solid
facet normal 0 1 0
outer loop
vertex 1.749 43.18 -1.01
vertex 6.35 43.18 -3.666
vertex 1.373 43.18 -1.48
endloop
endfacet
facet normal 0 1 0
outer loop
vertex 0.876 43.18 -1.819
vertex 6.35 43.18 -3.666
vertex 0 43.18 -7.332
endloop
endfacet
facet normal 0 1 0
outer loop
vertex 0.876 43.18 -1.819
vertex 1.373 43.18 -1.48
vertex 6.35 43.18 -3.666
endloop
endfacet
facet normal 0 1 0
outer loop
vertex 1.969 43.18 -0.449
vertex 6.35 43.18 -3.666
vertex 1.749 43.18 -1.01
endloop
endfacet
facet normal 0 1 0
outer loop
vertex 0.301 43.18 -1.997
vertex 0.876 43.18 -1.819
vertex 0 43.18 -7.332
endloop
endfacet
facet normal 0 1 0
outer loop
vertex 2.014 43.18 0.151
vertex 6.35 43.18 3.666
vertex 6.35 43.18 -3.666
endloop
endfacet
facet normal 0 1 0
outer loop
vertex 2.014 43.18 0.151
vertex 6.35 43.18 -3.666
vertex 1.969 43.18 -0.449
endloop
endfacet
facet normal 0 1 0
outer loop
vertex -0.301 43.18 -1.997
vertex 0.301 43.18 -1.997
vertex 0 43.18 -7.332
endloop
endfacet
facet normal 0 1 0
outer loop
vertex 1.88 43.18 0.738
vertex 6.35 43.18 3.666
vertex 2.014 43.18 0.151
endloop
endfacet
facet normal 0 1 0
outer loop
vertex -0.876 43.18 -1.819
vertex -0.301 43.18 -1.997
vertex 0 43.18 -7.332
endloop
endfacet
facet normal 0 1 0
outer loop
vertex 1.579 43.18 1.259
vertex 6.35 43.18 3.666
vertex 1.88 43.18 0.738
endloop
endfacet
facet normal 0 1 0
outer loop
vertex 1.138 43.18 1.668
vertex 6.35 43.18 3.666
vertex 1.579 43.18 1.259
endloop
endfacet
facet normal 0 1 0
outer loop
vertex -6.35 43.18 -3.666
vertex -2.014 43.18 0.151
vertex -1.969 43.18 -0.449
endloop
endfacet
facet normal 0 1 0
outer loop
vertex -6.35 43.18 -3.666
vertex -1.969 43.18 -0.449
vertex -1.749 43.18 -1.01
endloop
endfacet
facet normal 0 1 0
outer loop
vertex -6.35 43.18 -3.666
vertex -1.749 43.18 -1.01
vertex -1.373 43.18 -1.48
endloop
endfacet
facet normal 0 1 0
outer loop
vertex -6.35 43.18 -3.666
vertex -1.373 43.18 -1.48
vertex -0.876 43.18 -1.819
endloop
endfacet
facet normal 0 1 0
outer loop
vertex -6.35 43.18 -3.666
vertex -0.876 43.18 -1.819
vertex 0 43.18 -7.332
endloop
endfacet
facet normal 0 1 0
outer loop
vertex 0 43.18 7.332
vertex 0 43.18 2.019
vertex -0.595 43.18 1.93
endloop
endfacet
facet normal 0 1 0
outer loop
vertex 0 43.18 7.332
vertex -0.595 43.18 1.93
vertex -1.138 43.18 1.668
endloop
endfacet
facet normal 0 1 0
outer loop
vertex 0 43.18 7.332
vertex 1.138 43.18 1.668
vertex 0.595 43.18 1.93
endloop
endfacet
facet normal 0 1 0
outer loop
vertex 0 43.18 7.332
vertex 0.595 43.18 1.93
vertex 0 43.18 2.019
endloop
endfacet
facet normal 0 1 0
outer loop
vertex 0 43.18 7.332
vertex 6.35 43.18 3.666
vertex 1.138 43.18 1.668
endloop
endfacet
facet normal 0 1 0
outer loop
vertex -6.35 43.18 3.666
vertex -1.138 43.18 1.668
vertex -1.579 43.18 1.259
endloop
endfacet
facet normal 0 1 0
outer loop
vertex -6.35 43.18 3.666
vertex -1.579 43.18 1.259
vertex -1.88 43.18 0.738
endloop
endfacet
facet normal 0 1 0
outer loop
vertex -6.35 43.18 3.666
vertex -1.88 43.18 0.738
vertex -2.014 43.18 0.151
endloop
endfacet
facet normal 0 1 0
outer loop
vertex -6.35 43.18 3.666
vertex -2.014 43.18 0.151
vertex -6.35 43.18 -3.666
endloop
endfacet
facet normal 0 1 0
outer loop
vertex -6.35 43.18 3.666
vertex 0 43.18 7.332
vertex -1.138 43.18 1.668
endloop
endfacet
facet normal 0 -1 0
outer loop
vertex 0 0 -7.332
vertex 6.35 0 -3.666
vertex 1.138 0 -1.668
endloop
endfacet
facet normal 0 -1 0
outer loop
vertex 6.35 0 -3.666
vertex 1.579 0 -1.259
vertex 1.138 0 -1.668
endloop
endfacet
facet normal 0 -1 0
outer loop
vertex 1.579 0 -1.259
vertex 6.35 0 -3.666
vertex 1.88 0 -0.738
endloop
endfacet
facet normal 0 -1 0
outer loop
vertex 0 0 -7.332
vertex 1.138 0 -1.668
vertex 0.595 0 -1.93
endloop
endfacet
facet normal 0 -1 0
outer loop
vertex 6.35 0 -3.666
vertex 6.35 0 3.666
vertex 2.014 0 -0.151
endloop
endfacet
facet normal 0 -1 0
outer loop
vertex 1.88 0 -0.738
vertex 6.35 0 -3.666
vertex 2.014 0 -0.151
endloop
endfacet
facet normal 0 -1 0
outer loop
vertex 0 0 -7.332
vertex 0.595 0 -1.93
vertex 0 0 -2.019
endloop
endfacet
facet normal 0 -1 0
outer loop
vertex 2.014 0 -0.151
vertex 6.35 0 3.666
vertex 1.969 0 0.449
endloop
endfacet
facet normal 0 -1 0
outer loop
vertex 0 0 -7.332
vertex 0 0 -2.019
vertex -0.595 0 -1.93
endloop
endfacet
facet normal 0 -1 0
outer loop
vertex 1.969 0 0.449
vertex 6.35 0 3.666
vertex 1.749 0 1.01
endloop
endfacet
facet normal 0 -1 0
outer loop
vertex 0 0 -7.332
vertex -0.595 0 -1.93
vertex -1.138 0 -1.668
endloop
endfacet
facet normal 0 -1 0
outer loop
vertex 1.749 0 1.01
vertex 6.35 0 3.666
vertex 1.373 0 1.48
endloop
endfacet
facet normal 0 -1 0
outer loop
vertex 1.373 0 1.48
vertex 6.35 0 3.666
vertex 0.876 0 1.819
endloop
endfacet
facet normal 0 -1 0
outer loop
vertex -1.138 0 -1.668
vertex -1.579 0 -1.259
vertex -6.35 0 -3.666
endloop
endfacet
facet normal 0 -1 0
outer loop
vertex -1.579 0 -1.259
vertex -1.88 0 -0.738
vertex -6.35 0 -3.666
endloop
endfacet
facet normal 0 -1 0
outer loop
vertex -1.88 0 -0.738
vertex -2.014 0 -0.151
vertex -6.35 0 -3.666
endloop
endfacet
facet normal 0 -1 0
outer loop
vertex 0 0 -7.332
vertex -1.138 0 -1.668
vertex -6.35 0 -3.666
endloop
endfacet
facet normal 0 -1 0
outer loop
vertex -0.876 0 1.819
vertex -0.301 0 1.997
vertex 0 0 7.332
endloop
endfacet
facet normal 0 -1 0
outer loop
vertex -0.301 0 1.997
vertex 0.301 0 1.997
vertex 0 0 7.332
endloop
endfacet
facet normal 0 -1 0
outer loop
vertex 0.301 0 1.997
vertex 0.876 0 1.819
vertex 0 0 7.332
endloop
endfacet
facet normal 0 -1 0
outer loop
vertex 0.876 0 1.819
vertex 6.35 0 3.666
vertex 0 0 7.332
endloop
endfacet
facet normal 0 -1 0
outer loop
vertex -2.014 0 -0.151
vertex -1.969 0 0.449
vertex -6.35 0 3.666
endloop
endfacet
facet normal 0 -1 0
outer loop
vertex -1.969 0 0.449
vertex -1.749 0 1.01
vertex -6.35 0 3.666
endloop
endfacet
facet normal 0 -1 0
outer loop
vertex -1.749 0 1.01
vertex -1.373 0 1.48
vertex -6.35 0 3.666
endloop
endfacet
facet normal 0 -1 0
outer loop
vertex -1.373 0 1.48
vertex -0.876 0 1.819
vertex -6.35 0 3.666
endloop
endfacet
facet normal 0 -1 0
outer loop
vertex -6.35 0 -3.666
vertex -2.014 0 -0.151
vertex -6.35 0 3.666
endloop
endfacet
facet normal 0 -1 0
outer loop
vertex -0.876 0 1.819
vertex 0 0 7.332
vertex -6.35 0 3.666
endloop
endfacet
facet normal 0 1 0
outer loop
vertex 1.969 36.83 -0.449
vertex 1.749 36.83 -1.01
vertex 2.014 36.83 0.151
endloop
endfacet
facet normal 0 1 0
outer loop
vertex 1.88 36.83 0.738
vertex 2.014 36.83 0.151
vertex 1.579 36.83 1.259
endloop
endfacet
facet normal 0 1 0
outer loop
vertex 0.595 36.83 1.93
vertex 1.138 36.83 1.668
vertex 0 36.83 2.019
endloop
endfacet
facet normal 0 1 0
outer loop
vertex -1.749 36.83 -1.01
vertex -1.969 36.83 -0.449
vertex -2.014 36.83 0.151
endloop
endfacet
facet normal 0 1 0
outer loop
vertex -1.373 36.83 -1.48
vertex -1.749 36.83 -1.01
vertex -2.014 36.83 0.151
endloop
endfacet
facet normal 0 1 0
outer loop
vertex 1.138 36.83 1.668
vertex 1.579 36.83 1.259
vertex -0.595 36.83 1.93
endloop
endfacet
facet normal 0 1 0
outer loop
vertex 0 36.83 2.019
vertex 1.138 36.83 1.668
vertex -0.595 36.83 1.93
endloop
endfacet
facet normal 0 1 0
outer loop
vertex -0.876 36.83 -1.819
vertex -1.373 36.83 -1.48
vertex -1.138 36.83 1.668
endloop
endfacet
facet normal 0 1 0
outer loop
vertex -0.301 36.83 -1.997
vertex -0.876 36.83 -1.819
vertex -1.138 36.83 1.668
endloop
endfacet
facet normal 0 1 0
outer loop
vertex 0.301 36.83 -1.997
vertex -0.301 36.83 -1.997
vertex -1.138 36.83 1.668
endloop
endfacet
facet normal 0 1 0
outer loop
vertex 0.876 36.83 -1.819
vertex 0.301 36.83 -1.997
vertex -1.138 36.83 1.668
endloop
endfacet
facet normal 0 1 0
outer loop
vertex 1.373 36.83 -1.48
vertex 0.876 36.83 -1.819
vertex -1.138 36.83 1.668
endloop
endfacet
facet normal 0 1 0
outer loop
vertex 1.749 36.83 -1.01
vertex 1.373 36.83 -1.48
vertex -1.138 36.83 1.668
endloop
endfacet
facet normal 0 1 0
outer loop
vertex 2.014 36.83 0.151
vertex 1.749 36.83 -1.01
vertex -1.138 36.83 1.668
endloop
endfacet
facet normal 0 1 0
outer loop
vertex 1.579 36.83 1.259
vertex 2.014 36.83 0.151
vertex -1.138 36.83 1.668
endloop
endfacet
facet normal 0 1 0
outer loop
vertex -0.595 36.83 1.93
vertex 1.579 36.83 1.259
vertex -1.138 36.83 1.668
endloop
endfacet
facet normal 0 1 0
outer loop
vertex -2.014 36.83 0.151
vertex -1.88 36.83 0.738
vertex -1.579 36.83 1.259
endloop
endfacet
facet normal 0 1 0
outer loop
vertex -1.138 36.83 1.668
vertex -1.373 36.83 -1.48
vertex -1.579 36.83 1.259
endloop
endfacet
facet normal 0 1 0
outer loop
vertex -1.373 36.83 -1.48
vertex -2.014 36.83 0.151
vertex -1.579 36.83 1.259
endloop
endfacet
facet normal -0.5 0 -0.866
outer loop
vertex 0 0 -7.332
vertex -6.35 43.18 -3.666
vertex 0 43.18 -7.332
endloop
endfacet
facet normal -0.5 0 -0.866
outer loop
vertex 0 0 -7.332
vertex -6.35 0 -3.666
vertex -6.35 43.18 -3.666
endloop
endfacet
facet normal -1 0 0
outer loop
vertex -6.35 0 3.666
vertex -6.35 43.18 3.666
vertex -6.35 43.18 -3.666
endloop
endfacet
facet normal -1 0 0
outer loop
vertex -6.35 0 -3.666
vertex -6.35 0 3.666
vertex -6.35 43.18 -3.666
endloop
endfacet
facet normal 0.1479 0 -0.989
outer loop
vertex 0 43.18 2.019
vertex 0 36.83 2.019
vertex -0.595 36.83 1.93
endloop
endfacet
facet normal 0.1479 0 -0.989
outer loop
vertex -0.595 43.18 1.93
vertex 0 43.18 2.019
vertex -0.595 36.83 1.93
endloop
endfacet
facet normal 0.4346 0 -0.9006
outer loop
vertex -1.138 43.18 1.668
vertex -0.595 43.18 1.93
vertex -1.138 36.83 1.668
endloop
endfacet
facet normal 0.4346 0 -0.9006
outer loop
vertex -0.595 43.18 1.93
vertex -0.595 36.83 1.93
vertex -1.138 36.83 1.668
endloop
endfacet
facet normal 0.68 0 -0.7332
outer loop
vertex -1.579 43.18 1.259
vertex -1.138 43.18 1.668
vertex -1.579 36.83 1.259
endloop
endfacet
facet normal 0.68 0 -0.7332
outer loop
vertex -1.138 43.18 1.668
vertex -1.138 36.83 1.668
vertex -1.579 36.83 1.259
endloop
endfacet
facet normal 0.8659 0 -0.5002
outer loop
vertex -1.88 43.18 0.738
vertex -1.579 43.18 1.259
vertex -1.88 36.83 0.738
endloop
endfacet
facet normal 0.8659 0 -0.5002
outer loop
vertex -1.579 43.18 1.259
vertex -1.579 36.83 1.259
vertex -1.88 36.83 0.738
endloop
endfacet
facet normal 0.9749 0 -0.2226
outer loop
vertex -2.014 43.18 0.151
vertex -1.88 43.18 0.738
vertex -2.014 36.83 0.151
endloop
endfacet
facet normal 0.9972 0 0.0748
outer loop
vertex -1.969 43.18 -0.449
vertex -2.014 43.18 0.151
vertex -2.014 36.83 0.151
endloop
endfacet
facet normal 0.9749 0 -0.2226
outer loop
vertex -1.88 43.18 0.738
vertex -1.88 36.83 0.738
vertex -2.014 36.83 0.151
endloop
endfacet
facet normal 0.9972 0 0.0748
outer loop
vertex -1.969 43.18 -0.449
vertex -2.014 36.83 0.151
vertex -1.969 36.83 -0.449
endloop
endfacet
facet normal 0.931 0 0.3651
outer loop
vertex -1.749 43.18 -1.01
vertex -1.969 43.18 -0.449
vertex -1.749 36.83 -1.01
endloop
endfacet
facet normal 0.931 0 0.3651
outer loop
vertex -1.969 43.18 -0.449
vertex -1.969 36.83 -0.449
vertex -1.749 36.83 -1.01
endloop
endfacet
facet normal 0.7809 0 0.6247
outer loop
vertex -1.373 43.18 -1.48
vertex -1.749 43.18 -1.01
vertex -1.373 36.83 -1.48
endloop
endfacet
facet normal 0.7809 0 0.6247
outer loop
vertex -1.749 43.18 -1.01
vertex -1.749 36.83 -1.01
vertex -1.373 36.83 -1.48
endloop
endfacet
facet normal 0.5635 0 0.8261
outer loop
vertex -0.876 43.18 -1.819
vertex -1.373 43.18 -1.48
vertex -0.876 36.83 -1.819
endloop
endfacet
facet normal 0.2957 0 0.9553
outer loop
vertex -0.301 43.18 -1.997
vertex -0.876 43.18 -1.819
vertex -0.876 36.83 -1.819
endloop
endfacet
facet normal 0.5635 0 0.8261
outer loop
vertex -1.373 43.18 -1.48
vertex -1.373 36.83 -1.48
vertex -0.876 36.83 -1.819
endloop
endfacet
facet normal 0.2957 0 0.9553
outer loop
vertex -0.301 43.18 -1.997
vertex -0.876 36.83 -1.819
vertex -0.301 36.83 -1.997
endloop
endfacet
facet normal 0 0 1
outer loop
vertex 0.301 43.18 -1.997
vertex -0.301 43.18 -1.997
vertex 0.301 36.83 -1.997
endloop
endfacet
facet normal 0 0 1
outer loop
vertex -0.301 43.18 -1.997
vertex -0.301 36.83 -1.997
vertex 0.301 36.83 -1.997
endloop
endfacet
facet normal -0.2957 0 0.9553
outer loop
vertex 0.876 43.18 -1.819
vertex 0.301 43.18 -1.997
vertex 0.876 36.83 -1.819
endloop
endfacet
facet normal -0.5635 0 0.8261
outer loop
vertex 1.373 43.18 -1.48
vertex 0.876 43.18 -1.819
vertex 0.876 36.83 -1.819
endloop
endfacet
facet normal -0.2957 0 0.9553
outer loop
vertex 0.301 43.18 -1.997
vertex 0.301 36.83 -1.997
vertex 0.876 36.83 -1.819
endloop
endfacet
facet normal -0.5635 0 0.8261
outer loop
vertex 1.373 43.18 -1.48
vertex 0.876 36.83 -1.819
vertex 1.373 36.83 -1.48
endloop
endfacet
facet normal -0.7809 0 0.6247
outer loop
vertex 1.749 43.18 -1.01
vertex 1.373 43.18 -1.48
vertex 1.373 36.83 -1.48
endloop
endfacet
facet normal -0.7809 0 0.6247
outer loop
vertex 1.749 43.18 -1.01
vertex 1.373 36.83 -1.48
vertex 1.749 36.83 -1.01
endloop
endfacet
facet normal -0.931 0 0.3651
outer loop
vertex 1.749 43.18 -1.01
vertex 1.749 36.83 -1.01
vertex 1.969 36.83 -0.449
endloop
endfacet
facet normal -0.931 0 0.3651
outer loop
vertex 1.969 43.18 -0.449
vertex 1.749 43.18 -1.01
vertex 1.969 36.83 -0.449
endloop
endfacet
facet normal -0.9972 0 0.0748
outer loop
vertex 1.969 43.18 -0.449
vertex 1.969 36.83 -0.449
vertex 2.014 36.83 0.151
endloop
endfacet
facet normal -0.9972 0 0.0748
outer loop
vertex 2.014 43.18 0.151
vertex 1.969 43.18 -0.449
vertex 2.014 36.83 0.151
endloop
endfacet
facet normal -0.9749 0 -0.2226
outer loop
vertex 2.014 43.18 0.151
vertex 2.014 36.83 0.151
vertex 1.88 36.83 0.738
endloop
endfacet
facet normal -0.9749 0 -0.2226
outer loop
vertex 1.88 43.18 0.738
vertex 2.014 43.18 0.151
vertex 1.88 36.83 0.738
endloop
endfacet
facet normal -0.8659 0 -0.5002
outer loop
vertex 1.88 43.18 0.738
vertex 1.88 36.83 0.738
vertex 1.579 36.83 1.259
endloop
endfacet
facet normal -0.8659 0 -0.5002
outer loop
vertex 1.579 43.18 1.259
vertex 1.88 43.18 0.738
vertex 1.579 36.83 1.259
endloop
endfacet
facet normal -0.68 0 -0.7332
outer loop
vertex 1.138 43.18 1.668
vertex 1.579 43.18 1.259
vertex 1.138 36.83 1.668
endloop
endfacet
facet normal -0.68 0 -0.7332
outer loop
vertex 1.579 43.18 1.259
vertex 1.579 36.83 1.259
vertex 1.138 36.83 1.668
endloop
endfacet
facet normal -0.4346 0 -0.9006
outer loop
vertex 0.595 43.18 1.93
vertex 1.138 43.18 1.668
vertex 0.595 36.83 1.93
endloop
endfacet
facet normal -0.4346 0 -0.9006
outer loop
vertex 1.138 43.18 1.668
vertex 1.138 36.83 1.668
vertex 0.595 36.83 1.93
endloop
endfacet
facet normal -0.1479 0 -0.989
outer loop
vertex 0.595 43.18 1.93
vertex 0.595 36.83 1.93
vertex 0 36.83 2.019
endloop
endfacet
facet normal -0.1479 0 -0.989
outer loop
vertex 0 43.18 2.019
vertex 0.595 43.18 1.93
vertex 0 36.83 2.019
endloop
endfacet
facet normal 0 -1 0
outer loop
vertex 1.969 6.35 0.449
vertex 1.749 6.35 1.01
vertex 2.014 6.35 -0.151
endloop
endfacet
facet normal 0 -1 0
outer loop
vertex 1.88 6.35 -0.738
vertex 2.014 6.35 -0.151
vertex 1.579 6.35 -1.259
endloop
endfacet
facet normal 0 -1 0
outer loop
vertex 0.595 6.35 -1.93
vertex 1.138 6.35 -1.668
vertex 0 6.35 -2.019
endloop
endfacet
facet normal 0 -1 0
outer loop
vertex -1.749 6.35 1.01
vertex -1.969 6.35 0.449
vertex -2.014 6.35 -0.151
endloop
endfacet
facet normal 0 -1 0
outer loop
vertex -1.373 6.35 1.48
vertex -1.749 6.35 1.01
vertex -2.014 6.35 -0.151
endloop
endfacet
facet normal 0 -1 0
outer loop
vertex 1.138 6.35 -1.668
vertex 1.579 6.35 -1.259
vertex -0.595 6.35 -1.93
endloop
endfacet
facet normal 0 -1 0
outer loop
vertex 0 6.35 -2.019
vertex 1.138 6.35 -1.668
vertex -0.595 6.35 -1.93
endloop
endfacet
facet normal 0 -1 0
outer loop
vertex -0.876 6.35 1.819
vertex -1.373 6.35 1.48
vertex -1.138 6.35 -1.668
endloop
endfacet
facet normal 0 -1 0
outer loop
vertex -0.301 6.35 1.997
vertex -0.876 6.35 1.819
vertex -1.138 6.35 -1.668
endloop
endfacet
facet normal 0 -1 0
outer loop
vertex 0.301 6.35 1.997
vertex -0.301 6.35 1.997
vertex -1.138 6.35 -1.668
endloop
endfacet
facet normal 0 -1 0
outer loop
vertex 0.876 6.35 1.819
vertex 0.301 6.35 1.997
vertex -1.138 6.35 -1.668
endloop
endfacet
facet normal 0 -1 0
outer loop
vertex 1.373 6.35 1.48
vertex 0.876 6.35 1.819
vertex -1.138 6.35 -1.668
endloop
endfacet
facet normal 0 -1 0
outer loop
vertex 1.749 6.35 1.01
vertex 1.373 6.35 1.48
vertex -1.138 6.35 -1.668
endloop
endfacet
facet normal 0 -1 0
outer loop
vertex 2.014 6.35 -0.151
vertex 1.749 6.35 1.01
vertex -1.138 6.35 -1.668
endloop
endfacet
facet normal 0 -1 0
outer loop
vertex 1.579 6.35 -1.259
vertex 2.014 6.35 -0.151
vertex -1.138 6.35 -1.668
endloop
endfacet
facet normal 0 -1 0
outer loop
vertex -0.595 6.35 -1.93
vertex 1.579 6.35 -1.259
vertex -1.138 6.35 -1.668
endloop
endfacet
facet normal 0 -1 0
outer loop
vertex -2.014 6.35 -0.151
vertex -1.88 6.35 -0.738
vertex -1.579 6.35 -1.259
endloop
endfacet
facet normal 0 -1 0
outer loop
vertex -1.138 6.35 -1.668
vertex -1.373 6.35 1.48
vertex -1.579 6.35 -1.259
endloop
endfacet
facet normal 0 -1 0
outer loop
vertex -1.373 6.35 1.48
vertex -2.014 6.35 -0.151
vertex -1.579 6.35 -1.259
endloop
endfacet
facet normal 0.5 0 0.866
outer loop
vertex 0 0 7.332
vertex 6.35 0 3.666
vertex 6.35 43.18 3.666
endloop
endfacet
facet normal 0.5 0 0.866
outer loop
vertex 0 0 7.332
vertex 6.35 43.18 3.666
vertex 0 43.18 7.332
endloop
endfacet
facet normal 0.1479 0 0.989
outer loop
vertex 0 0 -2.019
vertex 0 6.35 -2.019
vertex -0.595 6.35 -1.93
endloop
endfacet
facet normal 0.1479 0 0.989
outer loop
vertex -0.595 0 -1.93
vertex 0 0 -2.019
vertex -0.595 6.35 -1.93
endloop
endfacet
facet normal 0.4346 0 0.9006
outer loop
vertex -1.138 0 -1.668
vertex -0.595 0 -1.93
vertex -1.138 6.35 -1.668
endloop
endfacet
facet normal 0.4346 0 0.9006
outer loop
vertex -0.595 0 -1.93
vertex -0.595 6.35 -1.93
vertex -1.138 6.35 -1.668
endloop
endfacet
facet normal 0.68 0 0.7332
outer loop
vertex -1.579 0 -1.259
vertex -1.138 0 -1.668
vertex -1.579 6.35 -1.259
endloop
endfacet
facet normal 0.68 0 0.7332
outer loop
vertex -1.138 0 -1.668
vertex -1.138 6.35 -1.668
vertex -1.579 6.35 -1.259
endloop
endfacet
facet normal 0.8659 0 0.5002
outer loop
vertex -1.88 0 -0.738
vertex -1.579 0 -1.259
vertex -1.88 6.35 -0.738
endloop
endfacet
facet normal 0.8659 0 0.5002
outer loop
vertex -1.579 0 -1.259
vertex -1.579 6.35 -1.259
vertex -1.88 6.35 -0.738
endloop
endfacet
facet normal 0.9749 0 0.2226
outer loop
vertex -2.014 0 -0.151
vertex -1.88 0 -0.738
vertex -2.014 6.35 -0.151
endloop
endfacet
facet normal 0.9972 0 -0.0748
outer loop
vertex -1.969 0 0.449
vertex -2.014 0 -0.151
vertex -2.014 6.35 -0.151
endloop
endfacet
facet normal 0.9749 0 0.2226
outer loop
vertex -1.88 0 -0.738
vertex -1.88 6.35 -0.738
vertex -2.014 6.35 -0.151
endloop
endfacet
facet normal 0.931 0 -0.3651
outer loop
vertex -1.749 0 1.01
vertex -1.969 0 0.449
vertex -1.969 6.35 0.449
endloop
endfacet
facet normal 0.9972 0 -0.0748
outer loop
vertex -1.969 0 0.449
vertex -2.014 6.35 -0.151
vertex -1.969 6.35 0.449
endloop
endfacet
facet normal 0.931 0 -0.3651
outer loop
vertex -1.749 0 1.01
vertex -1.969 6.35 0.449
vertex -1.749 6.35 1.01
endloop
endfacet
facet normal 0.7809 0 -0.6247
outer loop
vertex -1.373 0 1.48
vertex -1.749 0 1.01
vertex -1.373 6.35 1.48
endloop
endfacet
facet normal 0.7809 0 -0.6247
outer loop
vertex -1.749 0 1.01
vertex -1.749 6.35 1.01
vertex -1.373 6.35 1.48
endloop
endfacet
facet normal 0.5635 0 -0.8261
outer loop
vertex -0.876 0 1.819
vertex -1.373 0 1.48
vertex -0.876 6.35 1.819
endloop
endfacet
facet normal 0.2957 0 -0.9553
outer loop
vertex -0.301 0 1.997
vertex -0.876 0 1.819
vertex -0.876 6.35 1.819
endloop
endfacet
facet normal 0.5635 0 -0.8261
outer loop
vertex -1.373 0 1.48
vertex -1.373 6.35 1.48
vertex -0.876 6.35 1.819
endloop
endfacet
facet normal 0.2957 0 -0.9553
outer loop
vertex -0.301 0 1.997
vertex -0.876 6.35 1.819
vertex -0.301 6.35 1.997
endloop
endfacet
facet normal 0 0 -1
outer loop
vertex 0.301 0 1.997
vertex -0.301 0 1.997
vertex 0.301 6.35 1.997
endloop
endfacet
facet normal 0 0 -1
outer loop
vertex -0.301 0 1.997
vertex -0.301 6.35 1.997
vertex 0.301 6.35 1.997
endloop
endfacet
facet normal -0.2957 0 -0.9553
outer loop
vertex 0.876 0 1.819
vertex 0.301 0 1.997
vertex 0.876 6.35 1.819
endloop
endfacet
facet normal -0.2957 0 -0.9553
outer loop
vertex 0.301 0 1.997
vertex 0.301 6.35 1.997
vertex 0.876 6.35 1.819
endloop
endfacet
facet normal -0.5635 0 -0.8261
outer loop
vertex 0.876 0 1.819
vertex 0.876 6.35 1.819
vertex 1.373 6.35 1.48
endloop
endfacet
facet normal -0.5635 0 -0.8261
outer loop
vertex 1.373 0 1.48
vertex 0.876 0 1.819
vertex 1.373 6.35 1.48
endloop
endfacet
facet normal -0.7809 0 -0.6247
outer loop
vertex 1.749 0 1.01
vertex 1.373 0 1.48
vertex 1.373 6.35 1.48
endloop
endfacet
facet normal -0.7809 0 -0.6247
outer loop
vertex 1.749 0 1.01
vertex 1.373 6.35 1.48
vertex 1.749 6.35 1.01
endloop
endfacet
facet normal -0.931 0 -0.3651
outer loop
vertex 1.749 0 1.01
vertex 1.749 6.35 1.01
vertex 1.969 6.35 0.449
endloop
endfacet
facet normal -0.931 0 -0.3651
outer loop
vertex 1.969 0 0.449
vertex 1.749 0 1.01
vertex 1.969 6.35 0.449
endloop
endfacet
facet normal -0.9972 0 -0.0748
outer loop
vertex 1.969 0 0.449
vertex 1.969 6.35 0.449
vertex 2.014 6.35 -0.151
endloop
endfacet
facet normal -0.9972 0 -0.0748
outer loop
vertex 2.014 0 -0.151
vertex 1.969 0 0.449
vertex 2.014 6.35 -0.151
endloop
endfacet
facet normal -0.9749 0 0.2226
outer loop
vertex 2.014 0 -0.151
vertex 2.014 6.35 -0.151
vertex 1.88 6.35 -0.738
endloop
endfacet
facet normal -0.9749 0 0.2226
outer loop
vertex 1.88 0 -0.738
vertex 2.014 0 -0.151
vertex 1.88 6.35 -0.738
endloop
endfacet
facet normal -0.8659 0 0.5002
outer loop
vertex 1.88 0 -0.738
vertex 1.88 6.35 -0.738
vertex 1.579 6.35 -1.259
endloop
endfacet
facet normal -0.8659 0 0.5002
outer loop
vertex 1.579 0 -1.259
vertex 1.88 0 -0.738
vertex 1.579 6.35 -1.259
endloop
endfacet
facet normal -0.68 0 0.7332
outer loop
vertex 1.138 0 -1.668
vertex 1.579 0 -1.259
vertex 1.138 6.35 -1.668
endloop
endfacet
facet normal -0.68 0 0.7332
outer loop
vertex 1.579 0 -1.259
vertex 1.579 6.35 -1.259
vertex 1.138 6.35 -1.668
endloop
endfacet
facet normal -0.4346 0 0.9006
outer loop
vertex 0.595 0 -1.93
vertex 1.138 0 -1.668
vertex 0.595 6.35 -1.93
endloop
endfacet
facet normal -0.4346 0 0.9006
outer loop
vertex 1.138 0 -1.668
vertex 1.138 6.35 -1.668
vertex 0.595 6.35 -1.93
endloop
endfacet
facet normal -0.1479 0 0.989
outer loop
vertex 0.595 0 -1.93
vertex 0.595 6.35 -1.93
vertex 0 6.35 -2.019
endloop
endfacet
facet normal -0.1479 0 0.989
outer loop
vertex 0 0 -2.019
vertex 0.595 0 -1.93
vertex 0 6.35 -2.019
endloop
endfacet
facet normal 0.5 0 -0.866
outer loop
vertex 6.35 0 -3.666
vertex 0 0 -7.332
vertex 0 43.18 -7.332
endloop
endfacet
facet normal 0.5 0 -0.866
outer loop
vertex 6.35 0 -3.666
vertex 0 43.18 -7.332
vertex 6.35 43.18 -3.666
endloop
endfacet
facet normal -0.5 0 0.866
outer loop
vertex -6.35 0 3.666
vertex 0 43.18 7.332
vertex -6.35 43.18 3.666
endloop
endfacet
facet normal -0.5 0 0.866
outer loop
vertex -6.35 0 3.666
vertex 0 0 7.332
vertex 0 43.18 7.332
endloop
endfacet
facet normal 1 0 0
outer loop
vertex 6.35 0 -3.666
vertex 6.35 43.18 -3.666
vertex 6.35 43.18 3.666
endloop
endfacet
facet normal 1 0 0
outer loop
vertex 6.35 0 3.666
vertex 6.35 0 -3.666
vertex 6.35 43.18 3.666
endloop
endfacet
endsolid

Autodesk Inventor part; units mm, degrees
ref_plane "YZ Plane" through (0, 0, 0) normal (1, 0, 0) x (0, 1, 0)
ref_plane "XZ Plane" through (0, 0, 0) normal (0, 1, 0) x (-1, 0, 0)
ref_plane "XY Plane" through (0, 0, 0) normal (0, 0, 1) x (1, 0, 0)
sketch "Sketch1" plane through (0, 0, 0) normal (0, 1, 0) x (-1, 0, 0)
  line L0 (0, -7.3323) -> (-6.35, -3.6662)
  line L1 (-6.35, -3.6662) -> (-6.35, 3.6662)
  line L2 (-6.35, 3.6662) -> (0, 7.3323)
  line L3 (0, 7.3323) -> (6.35, 3.6662)
  line L4 (6.35, 3.6662) -> (6.35, -3.6662)
  line L5 (6.35, -3.6662) -> (0, -7.3323)
  point P0 (0, 0)
  point P1 (0, 0)
  dimension "d0" = 12.7
extrude "Extrusion1" add sketch "Sketch1" along normal blind 43.18
sketch "Sketch2" plane through (0, 43.18, 0) normal (0, 1, 0) x (1, 0, 0)
  point P0 (0, 0)
  point P1 (0, 0)
hole "Hole1" at (0, 43.18, 0) direction (0, -1, 0) diameter 4.0386 depth 6.35
sketch "Sketch3" plane through (0, 0, 0) normal (0, -1, 0) x (1, 0, 0)
  point P0 (0, 0)
  point P1 (0, 0)
hole "Hole2" at (0, 0, 0) direction (0, 1, 0) diameter 4.0386 depth 6.35
thread "Thread1" size "10-32 UNF" class "2B" standard "ANSI Unified Screw Threads" full length
properties part number "Gearboxes_002_Hexshaft my fav" material "Aluminum 6061"
